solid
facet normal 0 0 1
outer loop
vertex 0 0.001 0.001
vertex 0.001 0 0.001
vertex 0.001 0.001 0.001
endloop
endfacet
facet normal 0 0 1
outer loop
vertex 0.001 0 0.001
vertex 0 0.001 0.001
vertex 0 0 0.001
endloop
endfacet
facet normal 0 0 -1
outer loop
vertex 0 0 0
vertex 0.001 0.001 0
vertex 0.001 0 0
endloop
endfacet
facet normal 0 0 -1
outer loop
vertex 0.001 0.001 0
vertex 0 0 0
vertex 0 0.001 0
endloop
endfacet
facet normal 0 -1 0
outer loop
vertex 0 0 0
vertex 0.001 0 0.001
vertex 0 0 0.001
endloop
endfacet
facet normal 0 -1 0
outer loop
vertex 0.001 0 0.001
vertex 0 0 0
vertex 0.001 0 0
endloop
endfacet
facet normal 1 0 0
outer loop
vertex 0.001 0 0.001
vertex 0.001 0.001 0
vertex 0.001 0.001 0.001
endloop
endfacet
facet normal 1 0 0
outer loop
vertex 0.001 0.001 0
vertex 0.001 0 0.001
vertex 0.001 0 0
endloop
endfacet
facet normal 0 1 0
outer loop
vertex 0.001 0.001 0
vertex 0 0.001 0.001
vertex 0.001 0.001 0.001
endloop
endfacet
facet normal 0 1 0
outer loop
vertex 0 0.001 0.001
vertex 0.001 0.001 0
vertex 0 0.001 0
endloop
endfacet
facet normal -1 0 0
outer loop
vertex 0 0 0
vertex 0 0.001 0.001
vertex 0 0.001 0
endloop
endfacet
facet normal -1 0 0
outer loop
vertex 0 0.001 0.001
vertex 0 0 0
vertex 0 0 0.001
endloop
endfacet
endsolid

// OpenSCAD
// t_polyline — the incumbent frontend and its three guards.
// The guards themselves ABORT, so they cannot be asserted from inside OpenSCAD:
// they are exercised by tests/guards/ via `just guards`.

// clang-format off
use <../src/uniTube.scad>;
// clang-format on

// --- the worked elbow lowers to L, A, L --------------------------------------
p = ut_polyline([ [ 0, 0, 0 ], [ 50, 0, 0 ], [ 50, 50, 0 ] ], r = 15);
segs = ut_segs(p);
assert(len(segs) == 3, str("elbow should lower to 3 segments, got ", len(segs)));
assert(ut_seg_kind(segs[0]) == "L" && ut_seg_kind(segs[1]) == "A" && ut_seg_kind(segs[2]) == "L", "L, A, L");
assert(abs(ut_length(p) - 93.5619449019) < 1e-9, "exact developed length");

// The inset math: inset = r*tan(ang/2) = 15*tan(45) = 15, so the first leg is
// trimmed from 50 mm to 35 mm. docs/developer/history.md §1.
assert(abs(ut_seg_len(segs[0]) - 35) < 1e-9, str("leg trimmed by the tangent length, got ", ut_seg_len(segs[0])));
assert(norm(ut_seg_p1(segs[0]) - [ 35, 0, 0 ]) < 1e-9, "tangent point at 35 mm");

// The arc centre lies on the internal bisector at r/cos(ang/2) from the vertex.
assert(norm(segs[1][1] - [ 35, 15, 0 ]) < 1e-9, str("arc centre should be [35,15,0], got ", segs[1][1]));

// --- a straight run with no interior vertices --------------------------------
// BOSL2's round_corners hard-asserts on a 2-point path; ours must not, because a
// plain straight pipe is the trunk of every manifold.
straight = ut_polyline([ [ 0, 0, 0 ], [ 40, 0, 0 ] ]);
assert(len(ut_segs(straight)) == 1, "a 2-point path is one straight segment");
assert(abs(ut_length(straight) - 40) < 1e-9, "straight length");

// --- a scalar radius applies to INTERIOR vertices only -----------------------
sc = ut_polyline([ [ 0, 0, 0 ], [ 50, 0, 0 ], [ 50, 50, 0 ], [ 0, 50, 0 ] ], r = 10);
assert(len([for (s = ut_segs(sc)) if (ut_seg_kind(s) == "A") 1]) == 2, "2 interior vertices -> 2 arcs");

// --- GUARD 2, benign half: a collinear waypoint MERGES rather than NaN --------
col = ut_polyline([ [ 0, 0, 0 ], [ 25, 0, 0 ], [ 50, 0, 0 ], [ 50, 50, 0 ] ], r = 10);
assert(len([for (s = ut_segs(col)) if (ut_seg_kind(s) == "A") 1]) == 1,
       "a collinear waypoint must emit NO arc -- an arc there has a NaN centre");
assert(abs(ut_length(col) - ut_length(ut_polyline([ [ 0, 0, 0 ], [ 50, 0, 0 ], [ 50, 50, 0 ] ], r = 10))) < 1e-9,
       "the collinear waypoint changes nothing about the geometry");

// --- exactly-tangent bends: the zero-length straight is omitted --------------
// This is not an error; it is an S-bend with no straight between the arcs.
tang = ut_polyline([ [ 0, 0, 0 ], [ 100, 0, 0 ], [ 100, 100, 0 ], [ 0, 100, 0 ] ], r = 50);
assert(len([for (s = ut_segs(tang)) if (ut_seg_kind(s) == "L" && ut_seg_len(s) < 1e-9) 1]) == 0,
       "no degenerate zero-length straights are emitted");

// --- the legacy demo path lowers cleanly -------------------------------------
legacy = ut_polyline(
    [
        [ 0, 0, 0 ], [ 100, 0, 0 ], [ 100, 100, 0 ], [ 50, 100, 100 ], [ 50, 100, 150 ], [ 0, 100, 50 ], [ 0, 0, 0 ],
        [ 50, 0, 50 ]
    ],
    r = [ 70, 30, 30, 6, 50, 30 ]);
assert(len(ut_segs(legacy)) == 12, str("legacy demo lowers to 12 segments, got ", len(ut_segs(legacy))));
assert(len([for (s = ut_segs(legacy)) if (ut_seg_kind(s) == "A") 1]) == 6,
       "all SIX bends must be present -- they have rendered as nothing since 2025-01-10");

cube(0.001); // sentinel
